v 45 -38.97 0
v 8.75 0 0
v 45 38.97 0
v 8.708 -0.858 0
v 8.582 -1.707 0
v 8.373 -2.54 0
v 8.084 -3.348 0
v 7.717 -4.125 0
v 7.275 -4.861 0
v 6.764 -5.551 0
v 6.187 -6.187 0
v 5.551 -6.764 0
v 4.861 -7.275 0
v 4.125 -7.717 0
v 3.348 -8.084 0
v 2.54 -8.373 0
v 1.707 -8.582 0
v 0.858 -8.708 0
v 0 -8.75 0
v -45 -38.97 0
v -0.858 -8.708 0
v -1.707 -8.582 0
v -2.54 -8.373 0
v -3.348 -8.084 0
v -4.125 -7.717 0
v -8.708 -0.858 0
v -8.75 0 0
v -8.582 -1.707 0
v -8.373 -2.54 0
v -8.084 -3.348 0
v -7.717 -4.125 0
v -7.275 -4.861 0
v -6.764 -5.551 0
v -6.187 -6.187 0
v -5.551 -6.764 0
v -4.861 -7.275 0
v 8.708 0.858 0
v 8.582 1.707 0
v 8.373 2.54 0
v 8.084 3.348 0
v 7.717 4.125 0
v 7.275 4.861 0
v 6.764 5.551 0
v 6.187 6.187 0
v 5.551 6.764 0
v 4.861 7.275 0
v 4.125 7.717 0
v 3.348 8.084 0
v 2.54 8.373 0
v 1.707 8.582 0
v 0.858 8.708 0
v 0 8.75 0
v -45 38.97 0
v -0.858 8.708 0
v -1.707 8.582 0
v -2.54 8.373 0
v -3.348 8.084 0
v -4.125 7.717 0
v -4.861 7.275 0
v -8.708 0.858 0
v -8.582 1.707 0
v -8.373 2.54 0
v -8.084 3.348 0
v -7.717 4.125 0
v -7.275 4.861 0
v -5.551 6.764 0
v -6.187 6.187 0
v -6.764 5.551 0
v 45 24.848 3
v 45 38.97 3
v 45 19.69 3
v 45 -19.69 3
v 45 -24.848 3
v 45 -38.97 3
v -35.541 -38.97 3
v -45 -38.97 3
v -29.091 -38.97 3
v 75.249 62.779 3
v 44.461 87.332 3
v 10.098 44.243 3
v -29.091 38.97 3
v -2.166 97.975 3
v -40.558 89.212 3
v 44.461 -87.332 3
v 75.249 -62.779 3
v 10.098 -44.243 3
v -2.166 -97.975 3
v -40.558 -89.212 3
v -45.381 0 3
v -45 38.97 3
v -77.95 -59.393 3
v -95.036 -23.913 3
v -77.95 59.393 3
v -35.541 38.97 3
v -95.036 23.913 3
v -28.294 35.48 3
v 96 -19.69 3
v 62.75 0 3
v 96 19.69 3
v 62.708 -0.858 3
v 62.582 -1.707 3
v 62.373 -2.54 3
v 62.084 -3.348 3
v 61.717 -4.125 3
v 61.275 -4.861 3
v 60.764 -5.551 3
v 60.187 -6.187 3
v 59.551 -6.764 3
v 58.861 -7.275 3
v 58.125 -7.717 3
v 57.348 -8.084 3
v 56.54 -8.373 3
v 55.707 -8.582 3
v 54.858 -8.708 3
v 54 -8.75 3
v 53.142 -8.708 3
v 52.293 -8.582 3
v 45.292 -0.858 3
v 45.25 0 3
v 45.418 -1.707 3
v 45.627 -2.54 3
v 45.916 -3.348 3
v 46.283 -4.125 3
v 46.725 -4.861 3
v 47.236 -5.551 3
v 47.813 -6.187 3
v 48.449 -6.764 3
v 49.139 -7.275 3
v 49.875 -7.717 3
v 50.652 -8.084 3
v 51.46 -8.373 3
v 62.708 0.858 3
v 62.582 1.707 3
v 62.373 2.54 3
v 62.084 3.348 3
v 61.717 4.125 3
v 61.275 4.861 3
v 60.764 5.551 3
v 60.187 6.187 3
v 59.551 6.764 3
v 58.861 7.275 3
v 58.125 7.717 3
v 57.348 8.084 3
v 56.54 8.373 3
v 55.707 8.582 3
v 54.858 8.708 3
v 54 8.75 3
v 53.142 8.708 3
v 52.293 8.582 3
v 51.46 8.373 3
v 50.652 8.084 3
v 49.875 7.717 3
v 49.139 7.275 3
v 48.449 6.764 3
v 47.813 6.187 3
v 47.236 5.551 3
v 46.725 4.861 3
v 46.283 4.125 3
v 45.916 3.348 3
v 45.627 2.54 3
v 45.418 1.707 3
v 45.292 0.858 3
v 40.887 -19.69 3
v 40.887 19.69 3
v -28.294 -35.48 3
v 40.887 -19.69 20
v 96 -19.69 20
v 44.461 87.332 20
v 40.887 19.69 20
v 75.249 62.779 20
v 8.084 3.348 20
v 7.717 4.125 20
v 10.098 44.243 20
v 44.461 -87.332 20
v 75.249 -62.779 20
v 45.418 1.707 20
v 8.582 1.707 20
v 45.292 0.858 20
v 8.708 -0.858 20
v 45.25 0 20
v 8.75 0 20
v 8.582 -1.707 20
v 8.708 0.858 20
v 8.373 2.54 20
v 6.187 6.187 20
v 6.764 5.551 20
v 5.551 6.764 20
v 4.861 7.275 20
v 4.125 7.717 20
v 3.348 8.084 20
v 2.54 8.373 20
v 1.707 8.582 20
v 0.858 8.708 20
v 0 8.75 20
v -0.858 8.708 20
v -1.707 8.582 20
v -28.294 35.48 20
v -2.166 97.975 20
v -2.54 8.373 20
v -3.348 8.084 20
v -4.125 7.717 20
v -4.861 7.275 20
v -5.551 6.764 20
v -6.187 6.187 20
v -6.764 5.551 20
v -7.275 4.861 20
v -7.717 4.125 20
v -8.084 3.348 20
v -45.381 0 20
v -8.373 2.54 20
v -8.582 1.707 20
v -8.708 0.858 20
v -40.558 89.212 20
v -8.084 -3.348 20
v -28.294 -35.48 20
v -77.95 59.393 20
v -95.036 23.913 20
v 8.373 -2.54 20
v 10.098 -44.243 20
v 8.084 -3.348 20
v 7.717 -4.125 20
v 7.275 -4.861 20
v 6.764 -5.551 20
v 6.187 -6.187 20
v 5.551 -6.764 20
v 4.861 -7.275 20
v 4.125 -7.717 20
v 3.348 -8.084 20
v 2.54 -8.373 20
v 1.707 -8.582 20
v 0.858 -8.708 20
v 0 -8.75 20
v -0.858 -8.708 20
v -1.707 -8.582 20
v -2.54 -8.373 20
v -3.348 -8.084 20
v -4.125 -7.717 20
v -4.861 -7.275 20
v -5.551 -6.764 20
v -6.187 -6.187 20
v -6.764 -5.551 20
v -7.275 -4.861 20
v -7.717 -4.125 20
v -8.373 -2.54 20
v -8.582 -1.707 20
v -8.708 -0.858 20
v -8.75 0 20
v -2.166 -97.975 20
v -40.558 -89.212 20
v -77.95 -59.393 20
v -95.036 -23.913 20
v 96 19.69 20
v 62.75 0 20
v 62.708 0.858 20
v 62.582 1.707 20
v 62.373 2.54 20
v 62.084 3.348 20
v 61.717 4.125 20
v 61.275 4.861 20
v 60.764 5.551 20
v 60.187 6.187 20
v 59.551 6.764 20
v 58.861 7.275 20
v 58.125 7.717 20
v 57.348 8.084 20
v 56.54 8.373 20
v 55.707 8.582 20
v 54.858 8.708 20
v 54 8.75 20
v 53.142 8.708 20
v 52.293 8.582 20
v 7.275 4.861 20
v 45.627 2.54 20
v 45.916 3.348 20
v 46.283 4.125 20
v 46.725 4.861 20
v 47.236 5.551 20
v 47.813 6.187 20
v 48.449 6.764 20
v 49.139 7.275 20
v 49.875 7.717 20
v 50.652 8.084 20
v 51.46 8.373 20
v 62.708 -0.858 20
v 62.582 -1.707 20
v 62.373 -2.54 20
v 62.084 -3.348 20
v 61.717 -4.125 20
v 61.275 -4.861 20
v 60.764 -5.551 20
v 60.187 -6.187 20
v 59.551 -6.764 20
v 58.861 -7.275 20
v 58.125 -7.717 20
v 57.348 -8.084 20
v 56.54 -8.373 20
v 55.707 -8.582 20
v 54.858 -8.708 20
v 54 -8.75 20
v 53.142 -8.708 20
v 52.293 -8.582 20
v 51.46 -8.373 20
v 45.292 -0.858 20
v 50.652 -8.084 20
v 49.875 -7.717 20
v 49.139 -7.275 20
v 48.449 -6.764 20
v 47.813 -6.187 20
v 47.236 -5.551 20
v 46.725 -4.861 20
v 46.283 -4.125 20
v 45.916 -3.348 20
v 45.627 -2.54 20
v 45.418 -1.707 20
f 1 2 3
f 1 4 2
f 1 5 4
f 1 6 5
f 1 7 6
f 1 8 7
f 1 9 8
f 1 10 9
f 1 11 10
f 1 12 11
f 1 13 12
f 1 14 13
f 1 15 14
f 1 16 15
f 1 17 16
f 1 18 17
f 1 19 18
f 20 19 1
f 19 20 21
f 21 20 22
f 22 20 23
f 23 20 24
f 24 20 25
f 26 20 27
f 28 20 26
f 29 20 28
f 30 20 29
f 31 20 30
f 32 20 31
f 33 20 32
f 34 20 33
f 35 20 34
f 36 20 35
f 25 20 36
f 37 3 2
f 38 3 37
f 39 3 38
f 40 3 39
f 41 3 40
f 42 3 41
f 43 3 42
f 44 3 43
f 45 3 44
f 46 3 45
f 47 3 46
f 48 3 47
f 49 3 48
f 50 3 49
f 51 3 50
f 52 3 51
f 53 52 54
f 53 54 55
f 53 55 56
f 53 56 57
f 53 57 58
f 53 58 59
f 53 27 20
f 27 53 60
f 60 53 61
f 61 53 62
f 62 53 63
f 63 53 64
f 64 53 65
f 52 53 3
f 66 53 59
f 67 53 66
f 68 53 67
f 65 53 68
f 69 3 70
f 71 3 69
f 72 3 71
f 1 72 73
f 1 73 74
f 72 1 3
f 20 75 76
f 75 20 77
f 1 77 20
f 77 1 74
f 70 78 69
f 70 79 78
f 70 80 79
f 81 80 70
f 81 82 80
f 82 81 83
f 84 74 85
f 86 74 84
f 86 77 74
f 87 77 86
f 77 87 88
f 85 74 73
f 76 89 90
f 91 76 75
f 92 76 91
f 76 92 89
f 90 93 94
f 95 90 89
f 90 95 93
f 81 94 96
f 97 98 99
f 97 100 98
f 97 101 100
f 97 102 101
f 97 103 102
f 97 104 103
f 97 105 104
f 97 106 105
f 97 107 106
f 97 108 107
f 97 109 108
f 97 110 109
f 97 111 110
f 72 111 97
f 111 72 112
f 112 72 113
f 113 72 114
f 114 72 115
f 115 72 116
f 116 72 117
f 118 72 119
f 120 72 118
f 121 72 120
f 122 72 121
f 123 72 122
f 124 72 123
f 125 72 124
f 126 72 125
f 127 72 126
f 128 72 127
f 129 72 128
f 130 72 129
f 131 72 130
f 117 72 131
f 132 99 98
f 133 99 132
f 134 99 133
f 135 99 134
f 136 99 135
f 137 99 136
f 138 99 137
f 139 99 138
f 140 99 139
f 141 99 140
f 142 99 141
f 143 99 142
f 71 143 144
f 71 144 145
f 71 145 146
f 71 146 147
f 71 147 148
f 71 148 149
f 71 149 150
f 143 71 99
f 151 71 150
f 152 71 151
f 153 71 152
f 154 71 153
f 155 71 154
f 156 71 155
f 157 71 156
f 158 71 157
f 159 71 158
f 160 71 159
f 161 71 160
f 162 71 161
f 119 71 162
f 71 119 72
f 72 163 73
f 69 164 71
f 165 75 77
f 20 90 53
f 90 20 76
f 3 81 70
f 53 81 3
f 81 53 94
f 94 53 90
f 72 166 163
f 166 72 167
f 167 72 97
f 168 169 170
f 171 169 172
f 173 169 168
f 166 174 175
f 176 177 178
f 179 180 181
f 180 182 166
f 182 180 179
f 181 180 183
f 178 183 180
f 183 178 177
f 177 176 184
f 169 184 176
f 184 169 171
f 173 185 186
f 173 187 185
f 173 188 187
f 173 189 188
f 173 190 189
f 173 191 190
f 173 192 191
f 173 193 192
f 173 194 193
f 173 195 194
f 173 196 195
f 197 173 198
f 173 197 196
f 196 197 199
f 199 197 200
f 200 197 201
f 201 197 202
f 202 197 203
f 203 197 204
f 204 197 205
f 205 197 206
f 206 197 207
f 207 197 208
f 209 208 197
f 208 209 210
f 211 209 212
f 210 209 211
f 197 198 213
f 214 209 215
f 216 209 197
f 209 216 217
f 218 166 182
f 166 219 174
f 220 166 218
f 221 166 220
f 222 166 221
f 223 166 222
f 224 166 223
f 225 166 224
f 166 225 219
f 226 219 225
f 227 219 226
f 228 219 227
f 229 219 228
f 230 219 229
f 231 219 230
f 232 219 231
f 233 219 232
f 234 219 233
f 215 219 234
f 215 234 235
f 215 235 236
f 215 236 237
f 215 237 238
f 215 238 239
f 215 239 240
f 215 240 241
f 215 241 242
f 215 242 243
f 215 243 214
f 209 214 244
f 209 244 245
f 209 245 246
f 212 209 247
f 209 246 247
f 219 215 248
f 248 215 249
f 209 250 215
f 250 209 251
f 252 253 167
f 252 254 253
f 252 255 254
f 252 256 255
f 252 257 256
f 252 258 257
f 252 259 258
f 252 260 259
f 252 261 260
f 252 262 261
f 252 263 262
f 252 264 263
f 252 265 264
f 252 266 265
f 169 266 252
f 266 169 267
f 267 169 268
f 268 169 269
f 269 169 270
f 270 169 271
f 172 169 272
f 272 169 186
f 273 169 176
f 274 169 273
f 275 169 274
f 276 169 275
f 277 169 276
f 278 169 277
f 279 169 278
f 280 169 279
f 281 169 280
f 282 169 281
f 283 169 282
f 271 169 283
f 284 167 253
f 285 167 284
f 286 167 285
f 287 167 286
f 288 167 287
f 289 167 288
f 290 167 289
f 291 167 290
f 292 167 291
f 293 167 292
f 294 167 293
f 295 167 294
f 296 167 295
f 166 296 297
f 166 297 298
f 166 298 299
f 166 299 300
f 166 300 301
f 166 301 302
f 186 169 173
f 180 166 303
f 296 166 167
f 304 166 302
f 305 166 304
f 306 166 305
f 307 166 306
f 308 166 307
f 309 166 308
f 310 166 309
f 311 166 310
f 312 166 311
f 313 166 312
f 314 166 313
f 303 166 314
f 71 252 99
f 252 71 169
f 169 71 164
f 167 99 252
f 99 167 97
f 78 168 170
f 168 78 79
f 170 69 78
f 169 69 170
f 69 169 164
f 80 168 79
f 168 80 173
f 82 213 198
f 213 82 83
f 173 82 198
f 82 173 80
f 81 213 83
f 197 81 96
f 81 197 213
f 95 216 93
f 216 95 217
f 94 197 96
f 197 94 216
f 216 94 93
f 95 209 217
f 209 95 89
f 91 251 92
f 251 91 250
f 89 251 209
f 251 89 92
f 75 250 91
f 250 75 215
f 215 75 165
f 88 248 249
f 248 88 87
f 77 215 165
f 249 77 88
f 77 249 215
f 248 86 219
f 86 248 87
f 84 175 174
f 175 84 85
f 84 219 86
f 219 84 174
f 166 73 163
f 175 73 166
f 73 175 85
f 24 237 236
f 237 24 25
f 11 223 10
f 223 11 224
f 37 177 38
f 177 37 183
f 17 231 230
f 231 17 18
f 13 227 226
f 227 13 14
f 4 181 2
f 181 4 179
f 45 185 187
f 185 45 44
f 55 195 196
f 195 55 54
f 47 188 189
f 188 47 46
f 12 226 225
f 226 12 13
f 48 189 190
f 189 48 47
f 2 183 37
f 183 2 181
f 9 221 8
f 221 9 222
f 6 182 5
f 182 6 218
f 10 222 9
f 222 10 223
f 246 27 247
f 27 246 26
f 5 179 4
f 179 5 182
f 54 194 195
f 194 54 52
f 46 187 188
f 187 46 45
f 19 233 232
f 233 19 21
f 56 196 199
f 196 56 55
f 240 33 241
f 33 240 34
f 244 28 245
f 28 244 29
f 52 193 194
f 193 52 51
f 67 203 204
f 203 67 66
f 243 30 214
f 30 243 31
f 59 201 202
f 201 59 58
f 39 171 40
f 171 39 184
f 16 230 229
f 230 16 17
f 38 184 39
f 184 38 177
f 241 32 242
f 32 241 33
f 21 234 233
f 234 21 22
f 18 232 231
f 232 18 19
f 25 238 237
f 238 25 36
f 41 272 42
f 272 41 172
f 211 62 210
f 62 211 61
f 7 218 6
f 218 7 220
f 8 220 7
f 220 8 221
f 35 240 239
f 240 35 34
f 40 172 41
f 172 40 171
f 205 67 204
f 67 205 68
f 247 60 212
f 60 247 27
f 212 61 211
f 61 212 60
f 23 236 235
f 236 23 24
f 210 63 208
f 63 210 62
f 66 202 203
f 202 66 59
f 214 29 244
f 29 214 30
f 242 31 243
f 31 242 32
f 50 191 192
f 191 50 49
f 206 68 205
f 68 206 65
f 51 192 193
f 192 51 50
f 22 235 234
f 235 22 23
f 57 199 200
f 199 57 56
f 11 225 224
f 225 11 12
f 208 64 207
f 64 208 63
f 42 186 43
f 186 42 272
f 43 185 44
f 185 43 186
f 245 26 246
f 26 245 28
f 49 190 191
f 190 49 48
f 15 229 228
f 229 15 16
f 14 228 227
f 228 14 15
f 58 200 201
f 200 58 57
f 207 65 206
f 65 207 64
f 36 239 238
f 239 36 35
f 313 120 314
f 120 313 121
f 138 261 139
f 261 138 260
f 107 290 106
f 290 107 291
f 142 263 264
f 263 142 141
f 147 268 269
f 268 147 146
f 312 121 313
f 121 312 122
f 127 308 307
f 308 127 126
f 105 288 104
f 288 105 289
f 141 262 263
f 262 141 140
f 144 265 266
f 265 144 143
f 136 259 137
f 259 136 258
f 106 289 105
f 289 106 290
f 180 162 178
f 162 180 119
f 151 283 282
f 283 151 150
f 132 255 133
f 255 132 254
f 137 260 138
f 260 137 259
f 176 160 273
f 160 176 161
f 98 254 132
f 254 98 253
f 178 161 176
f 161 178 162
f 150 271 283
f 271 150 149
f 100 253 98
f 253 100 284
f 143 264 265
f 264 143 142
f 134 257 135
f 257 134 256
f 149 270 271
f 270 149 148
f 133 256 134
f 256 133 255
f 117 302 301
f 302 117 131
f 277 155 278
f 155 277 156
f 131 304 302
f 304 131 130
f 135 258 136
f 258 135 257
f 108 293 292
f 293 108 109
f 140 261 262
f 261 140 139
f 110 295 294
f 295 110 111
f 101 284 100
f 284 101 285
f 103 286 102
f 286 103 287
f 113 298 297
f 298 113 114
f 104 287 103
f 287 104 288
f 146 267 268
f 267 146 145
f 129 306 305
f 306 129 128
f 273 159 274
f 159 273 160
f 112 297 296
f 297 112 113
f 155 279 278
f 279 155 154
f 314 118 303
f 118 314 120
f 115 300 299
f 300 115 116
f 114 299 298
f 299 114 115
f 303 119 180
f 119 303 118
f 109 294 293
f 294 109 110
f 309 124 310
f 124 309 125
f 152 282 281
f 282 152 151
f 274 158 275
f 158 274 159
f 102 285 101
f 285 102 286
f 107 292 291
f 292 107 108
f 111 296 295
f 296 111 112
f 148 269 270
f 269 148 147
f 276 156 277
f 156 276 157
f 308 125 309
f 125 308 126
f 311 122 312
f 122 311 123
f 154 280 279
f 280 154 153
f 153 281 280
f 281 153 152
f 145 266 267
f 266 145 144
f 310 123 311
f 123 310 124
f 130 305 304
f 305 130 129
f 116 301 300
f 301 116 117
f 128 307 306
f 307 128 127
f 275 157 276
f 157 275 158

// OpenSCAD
// Built by bench/smallmodels/features/compiler.py from a list of features.
$fn = 64;
difference() {
  union() {
    translate([0, 0, 0]) linear_extrude(height = 3) polygon([[-45, -38.97], [45, -38.97], [45, 38.97], [-45, 38.97]]);
    translate([0, 0, 3]) linear_extrude(height = 17) polygon([[-42, -19.69], [42, -19.69], [42, 19.69], [-42, 19.69]]);
    translate([54, 0, 3]) rotate([0, 0, 0]) linear_extrude(height = 17) polygon([[-42, -19.69], [42, -19.69], [42, 19.69], [-42, 19.69]]); translate([33.6684, 42.2189, 3]) rotate([0, 0, 51.4286]) linear_extrude(height = 17) polygon([[-42, -19.69], [42, -19.69], [42, 19.69], [-42, 19.69]]); translate([-12.0161, 52.6461, 3]) rotate([0, 0, 102.8571]) linear_extrude(height = 17) polygon([[-42, -19.69], [42, -19.69], [42, 19.69], [-42, 19.69]]); translate([-48.6523, 23.4297, 3]) rotate([0, 0, 154.2857]) linear_extrude(height = 17) polygon([[-42, -19.69], [42, -19.69], [42, 19.69], [-42, 19.69]]); translate([-48.6523, -23.4297, 3]) rotate([0, 0, 205.7143]) linear_extrude(height = 17) polygon([[-42, -19.69], [42, -19.69], [42, 19.69], [-42, 19.69]]); translate([-12.0161, -52.6461, 3]) rotate([0, 0, 257.1429]) linear_extrude(height = 17) polygon([[-42, -19.69], [42, -19.69], [42, 19.69], [-42, 19.69]]); translate([33.6684, -42.2189, 3]) rotate([0, 0, 308.5714]) linear_extrude(height = 17) polygon([[-42, -19.69], [42, -19.69], [42, 19.69], [-42, 19.69]]);
  }
  union() {
    translate([0, 0, -1]) rotate([0, 0, 0]) cylinder(d = 17.5, h = 22);
    translate([54, 0, -1]) rotate([0, 0, 0]) cylinder(d = 17.5, h = 22);
  }
}
